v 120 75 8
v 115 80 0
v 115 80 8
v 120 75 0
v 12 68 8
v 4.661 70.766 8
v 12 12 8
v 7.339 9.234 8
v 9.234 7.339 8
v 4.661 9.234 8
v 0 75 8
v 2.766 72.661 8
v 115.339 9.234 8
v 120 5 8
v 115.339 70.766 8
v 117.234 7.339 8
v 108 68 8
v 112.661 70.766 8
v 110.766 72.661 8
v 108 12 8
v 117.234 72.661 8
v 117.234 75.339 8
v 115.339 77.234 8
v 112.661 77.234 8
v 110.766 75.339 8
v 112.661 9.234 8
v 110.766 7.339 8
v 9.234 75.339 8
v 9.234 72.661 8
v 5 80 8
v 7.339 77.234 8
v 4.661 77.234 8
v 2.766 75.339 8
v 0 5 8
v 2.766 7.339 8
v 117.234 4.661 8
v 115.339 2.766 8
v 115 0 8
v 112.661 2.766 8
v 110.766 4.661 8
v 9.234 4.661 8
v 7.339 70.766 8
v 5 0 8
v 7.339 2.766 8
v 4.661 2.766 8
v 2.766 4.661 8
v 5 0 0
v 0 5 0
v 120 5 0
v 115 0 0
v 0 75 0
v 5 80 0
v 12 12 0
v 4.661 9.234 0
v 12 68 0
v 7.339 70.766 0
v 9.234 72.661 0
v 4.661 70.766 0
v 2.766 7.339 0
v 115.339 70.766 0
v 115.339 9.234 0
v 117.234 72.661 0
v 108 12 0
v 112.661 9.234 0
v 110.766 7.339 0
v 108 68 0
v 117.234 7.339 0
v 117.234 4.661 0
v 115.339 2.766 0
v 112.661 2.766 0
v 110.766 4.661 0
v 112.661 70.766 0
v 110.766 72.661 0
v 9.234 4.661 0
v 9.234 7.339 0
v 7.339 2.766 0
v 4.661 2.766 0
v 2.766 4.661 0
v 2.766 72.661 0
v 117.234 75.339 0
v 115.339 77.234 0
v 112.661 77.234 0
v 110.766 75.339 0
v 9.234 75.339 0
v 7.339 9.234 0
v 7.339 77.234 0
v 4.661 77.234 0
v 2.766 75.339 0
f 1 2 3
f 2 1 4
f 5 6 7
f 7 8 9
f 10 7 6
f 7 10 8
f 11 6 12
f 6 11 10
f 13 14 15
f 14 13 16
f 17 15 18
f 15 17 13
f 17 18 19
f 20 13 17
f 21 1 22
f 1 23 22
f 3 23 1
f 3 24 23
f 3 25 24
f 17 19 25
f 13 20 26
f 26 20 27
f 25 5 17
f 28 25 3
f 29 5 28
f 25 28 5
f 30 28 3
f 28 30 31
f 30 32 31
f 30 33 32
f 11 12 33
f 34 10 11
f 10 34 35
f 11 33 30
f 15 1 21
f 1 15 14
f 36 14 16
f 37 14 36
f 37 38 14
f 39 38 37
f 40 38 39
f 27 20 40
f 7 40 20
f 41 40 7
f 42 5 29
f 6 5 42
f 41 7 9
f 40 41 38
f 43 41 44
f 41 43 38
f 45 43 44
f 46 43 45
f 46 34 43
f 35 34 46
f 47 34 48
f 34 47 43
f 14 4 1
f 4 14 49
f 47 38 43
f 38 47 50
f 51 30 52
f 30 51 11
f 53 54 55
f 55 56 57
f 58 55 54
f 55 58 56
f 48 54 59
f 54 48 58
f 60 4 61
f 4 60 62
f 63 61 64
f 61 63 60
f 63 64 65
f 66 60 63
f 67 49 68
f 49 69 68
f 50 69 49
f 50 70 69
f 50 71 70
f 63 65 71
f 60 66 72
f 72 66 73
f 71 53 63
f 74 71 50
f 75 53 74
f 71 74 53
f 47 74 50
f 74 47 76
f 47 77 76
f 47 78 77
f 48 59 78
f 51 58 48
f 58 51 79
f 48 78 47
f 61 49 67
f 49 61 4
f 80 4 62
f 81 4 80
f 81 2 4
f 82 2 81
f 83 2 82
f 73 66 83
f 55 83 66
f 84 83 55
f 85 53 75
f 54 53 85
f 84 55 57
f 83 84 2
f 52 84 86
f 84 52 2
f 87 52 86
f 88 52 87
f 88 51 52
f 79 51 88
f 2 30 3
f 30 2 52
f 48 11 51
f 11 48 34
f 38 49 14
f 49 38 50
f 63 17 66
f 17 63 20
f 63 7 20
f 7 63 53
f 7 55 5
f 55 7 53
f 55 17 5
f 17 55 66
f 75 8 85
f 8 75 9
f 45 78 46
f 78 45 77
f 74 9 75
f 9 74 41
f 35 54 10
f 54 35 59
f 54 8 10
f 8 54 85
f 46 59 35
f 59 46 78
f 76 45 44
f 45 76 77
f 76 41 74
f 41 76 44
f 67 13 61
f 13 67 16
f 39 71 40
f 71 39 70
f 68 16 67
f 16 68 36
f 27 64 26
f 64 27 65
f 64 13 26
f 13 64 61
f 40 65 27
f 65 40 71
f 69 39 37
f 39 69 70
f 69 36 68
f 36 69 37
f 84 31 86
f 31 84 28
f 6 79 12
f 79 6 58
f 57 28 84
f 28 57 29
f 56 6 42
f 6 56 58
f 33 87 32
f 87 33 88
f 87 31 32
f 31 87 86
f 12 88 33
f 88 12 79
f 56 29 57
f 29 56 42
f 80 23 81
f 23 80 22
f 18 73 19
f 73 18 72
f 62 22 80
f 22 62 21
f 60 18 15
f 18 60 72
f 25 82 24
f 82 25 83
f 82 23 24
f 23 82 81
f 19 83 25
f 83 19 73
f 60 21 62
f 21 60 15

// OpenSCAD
$fn = 32;

// ----------------------------------------------------------------------
// Frame plate: 120 x 80 frame, 12 mm rails
// ----------------------------------------------------------------------

// --- parameters (mm) ---
plate_l = 120;            // plate length, X
plate_w = 80;             // plate width, Y
plate_t = 8;              // plate thickness, Z (extrusion height)
corner_c = 5;             // corner chamfer
frame_bar = 12;           // frame rail width
bolt_r = 3.5;             // corner bolt window radius
bolt_inset = 6;           // bolt centre inset from the edges
fit_tol = 0.05;           // declared fit tolerance (prompt contract)
free_tol = 0.2;           // declared free tolerance (prompt contract)

win_l = plate_l - 2 * frame_bar;  // window length
win_w = plate_w - 2 * frame_bar;  // window width
bolt_d = 2 * bolt_r;  // corner hole diameter

profile = [[5, 0], [115, 0], [120, 5], [120, 75], [115, 80], [5, 80], [0, 75], [0, 5]];  // primary outline, 8 points, counter clockwise
void_1 = [[12, 12], [108, 12], [108, 68], [12, 68]];  // the window, 4 points
void_2 = [[9.234, 7.339], [7.339, 9.234], [4.661, 9.234], [2.766, 7.339], [2.766, 4.661], [4.661, 2.766], [7.339, 2.766], [9.234, 4.661]];  // corner bolt window, 8 points
void_3 = [[117.234, 7.339], [115.339, 9.234], [112.661, 9.234], [110.766, 7.339], [110.766, 4.661], [112.661, 2.766], [115.339, 2.766], [117.234, 4.661]];  // corner bolt window, 8 points
void_4 = [[9.234, 75.339], [7.339, 77.234], [4.661, 77.234], [2.766, 75.339], [2.766, 72.661], [4.661, 70.766], [7.339, 70.766], [9.234, 72.661]];  // corner bolt window, 8 points
void_5 = [[117.234, 75.339], [115.339, 77.234], [112.661, 77.234], [110.766, 75.339], [110.766, 72.661], [112.661, 70.766], [115.339, 70.766], [117.234, 72.661]];  // corner bolt window, 8 points

// --- the one profile operation ---
difference() {
  linear_extrude(height = plate_t) polygon(points = profile);
  translate([0, 0, -1])
    linear_extrude(height = plate_t + 2) polygon(points = void_1);
  translate([0, 0, -1])
    linear_extrude(height = plate_t + 2) polygon(points = void_2);
  translate([0, 0, -1])
    linear_extrude(height = plate_t + 2) polygon(points = void_3);
  translate([0, 0, -1])
    linear_extrude(height = plate_t + 2) polygon(points = void_4);
  translate([0, 0, -1])
    linear_extrude(height = plate_t + 2) polygon(points = void_5);
}
